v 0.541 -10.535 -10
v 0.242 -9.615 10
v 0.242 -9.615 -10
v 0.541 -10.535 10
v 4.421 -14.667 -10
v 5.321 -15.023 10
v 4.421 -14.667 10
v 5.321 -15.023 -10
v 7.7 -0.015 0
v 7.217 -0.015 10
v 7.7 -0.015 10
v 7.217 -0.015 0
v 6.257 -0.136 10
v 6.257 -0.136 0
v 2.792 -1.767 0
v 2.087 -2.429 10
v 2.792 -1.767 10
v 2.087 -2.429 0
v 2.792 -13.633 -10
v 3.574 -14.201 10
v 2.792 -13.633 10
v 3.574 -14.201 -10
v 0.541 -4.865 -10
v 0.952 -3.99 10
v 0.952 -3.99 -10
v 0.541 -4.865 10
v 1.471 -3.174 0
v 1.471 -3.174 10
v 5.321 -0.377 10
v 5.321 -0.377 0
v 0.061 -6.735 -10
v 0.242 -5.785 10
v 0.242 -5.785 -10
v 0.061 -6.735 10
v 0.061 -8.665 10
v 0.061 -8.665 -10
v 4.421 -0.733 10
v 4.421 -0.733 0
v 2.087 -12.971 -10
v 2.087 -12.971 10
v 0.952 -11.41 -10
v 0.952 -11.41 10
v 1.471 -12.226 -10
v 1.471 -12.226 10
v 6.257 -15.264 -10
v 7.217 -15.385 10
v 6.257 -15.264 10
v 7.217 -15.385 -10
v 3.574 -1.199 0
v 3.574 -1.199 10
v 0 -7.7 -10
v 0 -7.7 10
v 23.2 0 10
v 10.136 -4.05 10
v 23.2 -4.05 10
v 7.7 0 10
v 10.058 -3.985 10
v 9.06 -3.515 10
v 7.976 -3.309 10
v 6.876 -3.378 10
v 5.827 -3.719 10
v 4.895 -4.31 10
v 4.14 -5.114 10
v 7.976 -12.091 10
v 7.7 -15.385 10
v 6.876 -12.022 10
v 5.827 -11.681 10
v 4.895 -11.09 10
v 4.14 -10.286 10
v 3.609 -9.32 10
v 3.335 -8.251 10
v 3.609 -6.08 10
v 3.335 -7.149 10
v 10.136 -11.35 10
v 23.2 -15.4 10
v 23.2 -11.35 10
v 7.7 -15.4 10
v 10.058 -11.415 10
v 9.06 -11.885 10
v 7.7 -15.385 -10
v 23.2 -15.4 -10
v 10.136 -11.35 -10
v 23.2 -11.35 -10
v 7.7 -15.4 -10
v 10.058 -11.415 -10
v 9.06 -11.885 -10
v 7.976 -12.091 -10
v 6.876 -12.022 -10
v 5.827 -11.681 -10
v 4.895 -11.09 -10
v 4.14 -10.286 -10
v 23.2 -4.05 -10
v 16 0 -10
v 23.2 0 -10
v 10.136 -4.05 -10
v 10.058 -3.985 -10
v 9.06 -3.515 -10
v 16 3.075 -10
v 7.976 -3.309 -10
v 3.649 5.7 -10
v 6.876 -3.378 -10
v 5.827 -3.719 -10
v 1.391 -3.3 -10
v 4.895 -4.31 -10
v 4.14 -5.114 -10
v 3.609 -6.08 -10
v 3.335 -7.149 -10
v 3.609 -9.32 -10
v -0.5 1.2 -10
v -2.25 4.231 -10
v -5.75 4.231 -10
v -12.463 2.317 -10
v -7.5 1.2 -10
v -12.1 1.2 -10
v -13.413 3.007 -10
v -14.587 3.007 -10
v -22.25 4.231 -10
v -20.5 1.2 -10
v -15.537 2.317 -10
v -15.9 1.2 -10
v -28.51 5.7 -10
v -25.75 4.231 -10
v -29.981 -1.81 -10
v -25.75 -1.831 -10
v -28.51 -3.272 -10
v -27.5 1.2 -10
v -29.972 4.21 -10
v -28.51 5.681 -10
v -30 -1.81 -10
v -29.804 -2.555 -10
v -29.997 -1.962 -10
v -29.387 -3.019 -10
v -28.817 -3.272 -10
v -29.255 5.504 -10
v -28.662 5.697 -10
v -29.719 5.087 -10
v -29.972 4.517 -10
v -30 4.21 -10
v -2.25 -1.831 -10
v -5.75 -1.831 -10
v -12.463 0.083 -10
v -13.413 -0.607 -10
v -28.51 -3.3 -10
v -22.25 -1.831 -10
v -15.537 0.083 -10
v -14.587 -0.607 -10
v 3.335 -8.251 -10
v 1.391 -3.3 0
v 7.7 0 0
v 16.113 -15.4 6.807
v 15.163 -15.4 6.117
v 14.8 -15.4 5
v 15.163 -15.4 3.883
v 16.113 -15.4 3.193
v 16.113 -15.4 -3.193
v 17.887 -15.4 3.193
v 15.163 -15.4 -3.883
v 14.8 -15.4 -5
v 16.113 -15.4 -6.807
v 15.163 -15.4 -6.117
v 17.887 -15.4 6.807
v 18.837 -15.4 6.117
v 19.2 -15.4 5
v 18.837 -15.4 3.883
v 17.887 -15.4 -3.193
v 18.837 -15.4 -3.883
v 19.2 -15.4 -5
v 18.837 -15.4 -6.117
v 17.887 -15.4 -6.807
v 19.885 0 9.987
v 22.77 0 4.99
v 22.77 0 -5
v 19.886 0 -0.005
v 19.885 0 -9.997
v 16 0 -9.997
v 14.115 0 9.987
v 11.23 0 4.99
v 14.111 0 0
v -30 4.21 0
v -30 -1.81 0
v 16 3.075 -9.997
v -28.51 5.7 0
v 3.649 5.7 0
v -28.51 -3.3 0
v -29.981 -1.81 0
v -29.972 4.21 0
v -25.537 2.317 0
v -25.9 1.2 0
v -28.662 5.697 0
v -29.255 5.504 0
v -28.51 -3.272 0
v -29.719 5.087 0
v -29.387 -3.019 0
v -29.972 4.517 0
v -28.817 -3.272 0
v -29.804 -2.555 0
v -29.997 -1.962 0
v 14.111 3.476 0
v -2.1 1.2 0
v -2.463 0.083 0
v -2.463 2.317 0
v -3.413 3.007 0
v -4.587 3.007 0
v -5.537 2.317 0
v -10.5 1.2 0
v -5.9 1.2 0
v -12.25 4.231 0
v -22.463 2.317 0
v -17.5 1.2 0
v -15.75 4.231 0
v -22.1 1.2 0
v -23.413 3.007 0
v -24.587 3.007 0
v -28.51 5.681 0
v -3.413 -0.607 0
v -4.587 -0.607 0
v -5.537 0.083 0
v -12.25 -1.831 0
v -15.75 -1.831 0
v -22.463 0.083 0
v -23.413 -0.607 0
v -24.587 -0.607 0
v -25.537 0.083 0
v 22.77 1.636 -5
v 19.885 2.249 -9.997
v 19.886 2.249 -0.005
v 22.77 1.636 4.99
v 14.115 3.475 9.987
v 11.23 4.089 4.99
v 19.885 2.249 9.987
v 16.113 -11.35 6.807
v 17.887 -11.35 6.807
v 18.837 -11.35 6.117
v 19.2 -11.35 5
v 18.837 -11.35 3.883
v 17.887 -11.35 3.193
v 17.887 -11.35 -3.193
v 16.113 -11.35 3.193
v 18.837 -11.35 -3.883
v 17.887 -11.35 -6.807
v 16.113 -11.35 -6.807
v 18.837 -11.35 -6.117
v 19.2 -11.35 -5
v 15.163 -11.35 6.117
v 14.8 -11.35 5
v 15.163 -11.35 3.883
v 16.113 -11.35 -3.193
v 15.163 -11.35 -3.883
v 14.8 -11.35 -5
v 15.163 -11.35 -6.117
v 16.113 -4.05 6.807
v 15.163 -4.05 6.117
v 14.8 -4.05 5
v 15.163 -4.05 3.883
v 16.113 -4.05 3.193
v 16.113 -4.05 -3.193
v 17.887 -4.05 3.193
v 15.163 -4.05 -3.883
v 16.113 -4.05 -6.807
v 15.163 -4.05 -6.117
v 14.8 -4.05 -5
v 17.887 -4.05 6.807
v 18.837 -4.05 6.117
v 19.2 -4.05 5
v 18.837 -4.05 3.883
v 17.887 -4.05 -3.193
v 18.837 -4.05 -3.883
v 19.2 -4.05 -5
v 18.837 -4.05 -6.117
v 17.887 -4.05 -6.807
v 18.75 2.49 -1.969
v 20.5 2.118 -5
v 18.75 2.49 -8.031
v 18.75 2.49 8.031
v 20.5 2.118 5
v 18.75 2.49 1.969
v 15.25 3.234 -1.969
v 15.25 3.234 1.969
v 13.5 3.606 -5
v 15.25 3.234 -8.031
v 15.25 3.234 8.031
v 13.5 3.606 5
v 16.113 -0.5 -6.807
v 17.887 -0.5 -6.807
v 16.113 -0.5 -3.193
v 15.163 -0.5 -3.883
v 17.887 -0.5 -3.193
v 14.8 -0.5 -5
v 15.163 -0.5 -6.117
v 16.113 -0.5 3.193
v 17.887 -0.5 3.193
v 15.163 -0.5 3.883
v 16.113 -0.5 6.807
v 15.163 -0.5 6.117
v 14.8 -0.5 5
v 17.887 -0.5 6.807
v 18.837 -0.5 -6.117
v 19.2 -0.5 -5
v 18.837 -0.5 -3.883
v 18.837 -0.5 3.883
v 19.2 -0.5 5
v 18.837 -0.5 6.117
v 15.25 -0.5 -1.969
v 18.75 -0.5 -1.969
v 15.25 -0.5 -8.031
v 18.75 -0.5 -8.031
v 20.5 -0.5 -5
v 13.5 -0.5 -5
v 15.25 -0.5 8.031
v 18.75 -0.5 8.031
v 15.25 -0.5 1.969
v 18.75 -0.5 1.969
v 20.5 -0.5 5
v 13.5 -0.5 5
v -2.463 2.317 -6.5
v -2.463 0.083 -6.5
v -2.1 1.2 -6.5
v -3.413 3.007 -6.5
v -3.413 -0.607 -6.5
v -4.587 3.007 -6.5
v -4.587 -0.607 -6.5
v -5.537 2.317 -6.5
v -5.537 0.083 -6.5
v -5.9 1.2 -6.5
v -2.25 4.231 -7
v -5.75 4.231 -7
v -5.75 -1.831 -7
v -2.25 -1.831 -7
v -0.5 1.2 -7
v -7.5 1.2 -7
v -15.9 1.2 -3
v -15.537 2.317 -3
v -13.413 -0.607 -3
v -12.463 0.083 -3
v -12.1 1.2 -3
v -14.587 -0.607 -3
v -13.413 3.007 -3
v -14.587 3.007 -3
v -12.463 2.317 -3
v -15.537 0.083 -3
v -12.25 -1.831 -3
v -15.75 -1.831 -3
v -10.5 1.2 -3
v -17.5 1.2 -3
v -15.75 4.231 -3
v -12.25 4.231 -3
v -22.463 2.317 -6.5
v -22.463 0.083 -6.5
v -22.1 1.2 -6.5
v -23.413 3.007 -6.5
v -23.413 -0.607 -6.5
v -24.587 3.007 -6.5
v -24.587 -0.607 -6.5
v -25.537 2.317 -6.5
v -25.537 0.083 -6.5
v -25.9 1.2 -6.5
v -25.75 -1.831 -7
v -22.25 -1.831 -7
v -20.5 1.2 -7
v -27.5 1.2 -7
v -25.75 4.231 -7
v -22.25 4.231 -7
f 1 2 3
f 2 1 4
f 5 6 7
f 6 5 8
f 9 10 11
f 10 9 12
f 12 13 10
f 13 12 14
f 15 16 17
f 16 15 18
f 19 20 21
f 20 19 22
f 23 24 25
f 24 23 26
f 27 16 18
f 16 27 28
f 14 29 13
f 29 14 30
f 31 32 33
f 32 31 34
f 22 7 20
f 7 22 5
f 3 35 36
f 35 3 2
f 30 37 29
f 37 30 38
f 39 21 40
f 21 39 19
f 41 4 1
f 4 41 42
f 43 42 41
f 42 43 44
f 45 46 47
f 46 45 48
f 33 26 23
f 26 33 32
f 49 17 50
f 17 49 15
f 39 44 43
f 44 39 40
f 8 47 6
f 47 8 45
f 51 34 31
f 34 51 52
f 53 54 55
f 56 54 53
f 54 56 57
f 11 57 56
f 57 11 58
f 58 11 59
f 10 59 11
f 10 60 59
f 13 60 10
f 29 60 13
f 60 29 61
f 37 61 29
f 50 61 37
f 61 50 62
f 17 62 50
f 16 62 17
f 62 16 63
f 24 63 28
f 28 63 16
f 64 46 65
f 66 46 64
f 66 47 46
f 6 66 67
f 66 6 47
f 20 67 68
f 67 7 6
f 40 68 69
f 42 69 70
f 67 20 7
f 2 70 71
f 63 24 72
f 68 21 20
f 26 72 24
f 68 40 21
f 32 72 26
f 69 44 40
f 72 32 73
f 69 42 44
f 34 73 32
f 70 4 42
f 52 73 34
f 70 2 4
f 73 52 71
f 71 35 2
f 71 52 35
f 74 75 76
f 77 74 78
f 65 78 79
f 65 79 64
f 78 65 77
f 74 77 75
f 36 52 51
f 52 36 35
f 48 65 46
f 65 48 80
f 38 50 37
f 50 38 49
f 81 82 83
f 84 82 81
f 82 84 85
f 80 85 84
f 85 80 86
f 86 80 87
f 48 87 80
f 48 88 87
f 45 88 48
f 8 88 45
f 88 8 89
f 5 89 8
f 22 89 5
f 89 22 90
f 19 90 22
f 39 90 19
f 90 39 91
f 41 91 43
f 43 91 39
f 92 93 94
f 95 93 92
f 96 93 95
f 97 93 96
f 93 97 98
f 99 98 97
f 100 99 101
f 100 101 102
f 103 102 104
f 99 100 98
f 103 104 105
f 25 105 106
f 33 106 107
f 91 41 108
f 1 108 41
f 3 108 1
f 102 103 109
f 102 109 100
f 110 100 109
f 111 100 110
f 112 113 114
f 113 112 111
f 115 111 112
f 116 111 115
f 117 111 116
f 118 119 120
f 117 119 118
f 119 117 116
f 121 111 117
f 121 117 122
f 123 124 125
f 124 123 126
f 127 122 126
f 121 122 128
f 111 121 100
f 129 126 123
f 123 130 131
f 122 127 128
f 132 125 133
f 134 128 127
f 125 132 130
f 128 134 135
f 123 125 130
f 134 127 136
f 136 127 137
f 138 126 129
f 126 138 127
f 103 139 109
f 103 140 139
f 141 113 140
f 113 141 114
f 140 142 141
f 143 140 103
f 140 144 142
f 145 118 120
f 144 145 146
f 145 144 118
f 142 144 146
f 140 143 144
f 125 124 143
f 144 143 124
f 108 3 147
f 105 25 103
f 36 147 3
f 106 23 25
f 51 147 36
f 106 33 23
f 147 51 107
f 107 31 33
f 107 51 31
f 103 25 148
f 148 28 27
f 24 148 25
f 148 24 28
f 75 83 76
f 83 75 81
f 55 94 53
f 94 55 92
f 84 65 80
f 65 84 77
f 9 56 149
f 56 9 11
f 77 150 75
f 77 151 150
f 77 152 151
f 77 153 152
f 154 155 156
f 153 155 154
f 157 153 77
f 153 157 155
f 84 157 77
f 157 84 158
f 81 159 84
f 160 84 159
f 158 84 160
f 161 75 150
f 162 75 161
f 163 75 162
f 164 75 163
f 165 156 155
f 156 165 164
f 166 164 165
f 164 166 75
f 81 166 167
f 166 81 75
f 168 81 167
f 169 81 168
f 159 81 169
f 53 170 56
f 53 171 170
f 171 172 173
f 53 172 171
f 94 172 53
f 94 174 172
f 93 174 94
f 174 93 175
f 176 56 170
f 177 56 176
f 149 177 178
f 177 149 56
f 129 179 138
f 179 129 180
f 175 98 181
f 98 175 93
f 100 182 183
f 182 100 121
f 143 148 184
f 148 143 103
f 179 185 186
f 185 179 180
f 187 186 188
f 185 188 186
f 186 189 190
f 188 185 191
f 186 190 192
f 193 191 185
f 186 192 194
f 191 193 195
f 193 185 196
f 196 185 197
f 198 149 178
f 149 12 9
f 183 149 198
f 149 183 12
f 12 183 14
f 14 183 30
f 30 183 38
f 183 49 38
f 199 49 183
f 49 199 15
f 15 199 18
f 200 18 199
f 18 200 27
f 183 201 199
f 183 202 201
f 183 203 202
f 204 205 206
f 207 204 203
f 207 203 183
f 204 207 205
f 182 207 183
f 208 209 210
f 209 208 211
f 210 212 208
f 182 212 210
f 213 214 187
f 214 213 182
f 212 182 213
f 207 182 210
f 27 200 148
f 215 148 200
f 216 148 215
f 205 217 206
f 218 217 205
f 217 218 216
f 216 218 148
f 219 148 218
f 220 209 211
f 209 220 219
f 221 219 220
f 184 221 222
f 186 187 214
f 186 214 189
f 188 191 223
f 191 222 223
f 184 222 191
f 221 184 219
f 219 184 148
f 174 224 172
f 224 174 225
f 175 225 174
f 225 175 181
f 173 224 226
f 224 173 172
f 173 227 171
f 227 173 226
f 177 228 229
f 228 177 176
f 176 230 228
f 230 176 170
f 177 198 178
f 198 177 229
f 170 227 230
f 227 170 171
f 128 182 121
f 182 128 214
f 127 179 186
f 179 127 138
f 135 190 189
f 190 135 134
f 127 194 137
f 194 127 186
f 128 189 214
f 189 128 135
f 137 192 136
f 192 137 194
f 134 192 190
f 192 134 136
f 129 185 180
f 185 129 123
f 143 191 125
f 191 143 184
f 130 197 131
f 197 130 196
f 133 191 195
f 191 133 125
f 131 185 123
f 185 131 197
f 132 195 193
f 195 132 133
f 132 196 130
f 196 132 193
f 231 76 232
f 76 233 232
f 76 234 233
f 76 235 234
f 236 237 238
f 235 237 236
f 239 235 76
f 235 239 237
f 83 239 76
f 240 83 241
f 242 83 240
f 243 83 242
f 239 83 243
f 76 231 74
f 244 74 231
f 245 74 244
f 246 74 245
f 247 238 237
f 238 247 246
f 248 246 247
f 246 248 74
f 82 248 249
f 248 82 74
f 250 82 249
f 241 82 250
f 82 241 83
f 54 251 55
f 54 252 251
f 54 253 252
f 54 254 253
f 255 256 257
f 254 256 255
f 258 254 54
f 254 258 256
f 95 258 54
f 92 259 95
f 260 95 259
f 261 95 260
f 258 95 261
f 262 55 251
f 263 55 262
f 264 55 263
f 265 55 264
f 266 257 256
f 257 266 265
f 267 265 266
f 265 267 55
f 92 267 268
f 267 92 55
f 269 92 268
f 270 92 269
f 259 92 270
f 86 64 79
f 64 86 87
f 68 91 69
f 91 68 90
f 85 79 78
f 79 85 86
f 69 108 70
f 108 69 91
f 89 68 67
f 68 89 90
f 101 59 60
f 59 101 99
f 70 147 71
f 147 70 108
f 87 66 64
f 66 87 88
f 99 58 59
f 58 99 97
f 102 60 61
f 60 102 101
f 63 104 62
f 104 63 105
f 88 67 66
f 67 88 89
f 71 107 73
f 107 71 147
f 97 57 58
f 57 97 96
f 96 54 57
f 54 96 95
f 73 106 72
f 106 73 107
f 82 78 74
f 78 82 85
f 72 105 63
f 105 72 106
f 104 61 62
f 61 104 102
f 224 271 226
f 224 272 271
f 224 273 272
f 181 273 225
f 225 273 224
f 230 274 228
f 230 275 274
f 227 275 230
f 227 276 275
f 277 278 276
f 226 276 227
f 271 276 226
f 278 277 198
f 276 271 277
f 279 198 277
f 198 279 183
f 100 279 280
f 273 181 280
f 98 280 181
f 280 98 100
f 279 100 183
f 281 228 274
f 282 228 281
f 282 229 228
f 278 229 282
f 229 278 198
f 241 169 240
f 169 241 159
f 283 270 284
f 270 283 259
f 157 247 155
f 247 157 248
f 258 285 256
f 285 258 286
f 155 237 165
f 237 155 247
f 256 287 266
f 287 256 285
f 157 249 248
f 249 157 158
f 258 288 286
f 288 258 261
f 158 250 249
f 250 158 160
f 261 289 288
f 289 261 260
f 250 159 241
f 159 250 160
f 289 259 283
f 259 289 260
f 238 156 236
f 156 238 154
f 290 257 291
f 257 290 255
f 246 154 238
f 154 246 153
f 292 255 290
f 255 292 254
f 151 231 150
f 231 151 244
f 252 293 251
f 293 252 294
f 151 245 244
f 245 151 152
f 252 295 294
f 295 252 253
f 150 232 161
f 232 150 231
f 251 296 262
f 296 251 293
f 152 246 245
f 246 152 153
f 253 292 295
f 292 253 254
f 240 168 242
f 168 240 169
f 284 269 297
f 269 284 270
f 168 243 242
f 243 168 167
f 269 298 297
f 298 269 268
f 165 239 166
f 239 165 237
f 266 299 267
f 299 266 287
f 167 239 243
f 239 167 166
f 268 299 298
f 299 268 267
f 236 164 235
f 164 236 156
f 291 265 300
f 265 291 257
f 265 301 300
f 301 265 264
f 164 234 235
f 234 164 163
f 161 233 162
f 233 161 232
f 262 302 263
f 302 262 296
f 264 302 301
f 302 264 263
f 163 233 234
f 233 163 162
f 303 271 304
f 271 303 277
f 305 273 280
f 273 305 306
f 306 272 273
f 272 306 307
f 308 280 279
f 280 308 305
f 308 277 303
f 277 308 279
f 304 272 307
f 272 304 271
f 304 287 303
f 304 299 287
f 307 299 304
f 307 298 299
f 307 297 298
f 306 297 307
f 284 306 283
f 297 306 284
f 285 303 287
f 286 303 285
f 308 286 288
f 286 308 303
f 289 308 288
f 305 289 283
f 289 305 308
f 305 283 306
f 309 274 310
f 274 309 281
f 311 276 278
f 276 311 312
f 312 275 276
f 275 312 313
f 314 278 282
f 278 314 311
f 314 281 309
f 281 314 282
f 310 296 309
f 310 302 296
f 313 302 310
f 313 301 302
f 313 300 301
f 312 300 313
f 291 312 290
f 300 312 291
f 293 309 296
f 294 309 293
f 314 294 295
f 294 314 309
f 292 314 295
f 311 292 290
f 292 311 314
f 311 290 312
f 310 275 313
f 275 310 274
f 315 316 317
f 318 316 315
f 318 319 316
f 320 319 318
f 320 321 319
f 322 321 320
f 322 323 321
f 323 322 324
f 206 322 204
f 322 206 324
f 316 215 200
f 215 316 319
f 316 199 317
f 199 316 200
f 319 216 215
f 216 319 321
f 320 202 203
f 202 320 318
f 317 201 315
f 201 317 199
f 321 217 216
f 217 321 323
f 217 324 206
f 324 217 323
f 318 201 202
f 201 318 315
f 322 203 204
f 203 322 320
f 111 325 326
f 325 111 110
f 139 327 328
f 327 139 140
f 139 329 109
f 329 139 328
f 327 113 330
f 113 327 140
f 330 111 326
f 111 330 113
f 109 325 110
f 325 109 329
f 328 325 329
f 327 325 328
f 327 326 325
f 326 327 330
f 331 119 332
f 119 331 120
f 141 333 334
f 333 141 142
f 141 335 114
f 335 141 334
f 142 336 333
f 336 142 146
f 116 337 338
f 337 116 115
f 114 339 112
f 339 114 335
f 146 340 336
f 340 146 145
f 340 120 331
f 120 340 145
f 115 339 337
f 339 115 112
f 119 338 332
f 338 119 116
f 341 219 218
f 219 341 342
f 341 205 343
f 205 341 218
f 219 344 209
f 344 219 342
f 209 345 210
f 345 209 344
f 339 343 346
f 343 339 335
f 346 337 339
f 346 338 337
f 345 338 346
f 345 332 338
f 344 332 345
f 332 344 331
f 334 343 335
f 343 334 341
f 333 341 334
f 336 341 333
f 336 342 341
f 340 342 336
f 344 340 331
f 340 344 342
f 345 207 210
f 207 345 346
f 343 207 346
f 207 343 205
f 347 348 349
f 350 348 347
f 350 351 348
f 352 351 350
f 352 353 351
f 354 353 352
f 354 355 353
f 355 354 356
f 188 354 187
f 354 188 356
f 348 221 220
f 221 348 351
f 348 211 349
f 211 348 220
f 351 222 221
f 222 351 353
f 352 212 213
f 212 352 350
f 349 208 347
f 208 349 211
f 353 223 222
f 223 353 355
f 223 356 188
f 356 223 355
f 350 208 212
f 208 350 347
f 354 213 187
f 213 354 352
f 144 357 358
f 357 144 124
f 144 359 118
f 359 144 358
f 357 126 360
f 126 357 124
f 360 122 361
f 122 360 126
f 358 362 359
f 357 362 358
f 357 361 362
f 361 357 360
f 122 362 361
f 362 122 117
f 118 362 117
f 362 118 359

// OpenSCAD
// PRUSA Mendel
// Vertical Adjustable Opto Z Endstop Holder
// Used to attach endstops to 8mm rods
// GNU GPL v3
// Shannon Little from Geoff Drake from original idea by Josef Průša
// Tags: endstop, opto_endstop, adjustable_endstop, mendel, prusa, mount, openscad, opto, z_axis_endstop, z-axis, axis, part
// Version 1.0

// This is a derivative of http://www.thingiverse.com/thing:15448

/**
 * @id vertical-adjustable-z-endstop-holder
 * @name Vertical Adjustable Z Endstop Holder
 * @category Printed
 * @using 2 m3x25xhex
 * @using 1 m3x35xhex
 * @using 2 m3nut
 * @using 3 m3nylock
 * @using 2 m3washer
 * @using 2 4-40nut
 * @using 2 4-40x5/8
 * @using 1 spring
 */

// % Background Modifier
// # Debug Modifier
// ! Root Modifier
// * Disable Modifier


// The M3 bolt holes should be as close to the actual bolt diameter as possible so the bolts wiggle as little as possible (this is critical to keep the opto from pivoting around the center bolt)
// You may need to drill the hole out just slightly so the bolts barely fit (I used Harbor Freight drill bit #32, which measures 2.91mm or 0.114in)
m3Diameter = 3.8;
m3NutDiameter = 7.0;						// You may need to tweak this for your machine
m8Diameter = 8.8;
outerDiameter = m8Diameter / 2 + 3.3;
openingSize = m8Diameter - 1.5;

optoMountBoltDiameter = 4.35;				// This is a little larger than necessary to allow some wiggle room on installing the opto pcb
optoMountNutDiameter = 7.8; 				// This is sized for a 4-40 nut, use the above m3NutDiameter value for M3 nuts

armLength = 31;
armWidth = 9;
holderHeight = 12;
holderAdditionalWidth = 1;
springDiameter = 5.9;
springHolderDepth = 1;
cornerRound = 3;
boltOffset = 4;
boltSpacing = 10;


// Uncomment these individually to export each part for printing

//thumbscrew();
rotate([180, 0, 0]) endstop();
//holder();

// Comment these out when printing the parts, this view only shows the parts in assembled positions

// endstop();
// translate([1, armWidth - 5, 19]) rotate([0, 0, 180]) holder();
// translate([-boltOffset, -1, -10]) rotate([180, 0, 0]) thumbscrewLowPoly();						// OpenSCAD was choking on the higher poly thumbscrews so these are low poly ones just for previewing, when printing use the normal high poly ones above
// translate([-boltOffset - boltSpacing * 2, -1, -10]) rotate([180, 0, 0]) thumbscrewLowPoly();
// showAssemblyHardware();










module showAssemblyHardware() {
	translate([-boltOffset, -1, -10]) {
		translate([0, 0, -35]) hexBolt(3, 25);
		translate([0, 0, 4]) hexNut(3, 25);
		translate([0, 0, 23]) hexNylock(3, 25);
	}

	translate([-boltOffset - boltSpacing, -1, -10]) {
		translate([0, 0, 80]) rotate([180, 0, 0]) hexBolt(3, 25);
		translate([0, 0, 6]) rotate([180, 0, 0]) hexNylock(3, 25);
		translate([0, 0, 43]) color("silver") linear_extrude(height = 10, center = false, convexity = 10, twist = 3000, $fn = 15) translate([2.3, 0, 0]) circle(r = 0.2);
	}

	translate([-boltOffset - boltSpacing * 2, -1, -10]) {
		translate([0, 0, -35]) hexBolt(3, 25);
		translate([0, 0, 4]) hexNut(3, 25);
		translate([0, 0, 23]) hexNylock(3, 25);
	}
}


// These are not really accurate, they are just for showing how to assemble the endstop
module hexBolt(diameter = 3, height = 30) {
	color("silver")
	union() {
		cylinder(h = 1.5, r = 1.5 + diameter / 2, $fn = 6);
		cylinder(h = height, r = diameter / 2, $fn = 20);
	}
}


module hexNut(diameter = 3) {
	color("silver")
	difference() {
		cylinder(h = 1.5, r = 1.5 + diameter / 2, $fn = 6);
		translate([0, 0, -0.5]) cylinder(h = 3, r = diameter / 2, $fn = 20);
	}
}


module hexNylock(diameter = 3) {
	color("silver")
	difference() {
		union() {
			cylinder(h = 1.5, r = 1.5 + diameter / 2, $fn = 6);
			translate([0, 0, 1.5]) sphere(r = diameter / 2 + 0.6, $fn = 20);
		}

		translate([0, 0, -0.5]) cylinder(h = diameter * 2, r = diameter / 2, $fn = 20);
		translate([0, 0, -diameter]) cube(size = diameter * 2, center = true);
	}
}


module endstop() {
	difference() {
		// Outline
		union() {
			translate([outerDiameter, outerDiameter, -10]) cylinder(h = 20, r = outerDiameter, $fn = 50);									// Round clamp
			translate([outerDiameter, 0, -10]) cube([15.5, outerDiameter * 2,20]);														// Cube clamp
			translate([-armLength + 1, outerDiameter - m8Diameter / 2, 0]) rotate([90, 0, 0]) cube([armLength + 15, 10, armWidth]);		// Arm
            translate([17, 3, 5]) rotate([90, 0, 0]) cylinder(h = armWidth - 0.3, r = 5.77, $fn = 6);                                   // Nut trap
            translate([17, 3, -5+.01]) rotate([90, 0, 0]) cylinder(h = armWidth - 0.3, r = 5.77, $fn = 6);                                   // Nut trap
		}

		// Clamp
		translate([9, outerDiameter - openingSize / 2, -10.1]) 	cube([18, openingSize, 22]);								// Endstop opening slot
		translate([outerDiameter, outerDiameter, -10.1]) 		cylinder(h = 25, r = m8Diameter / 2, $fn = 25);				// Endstop rod clamp opening
		translate([outerDiameter - 3, -outerDiameter - armWidth + 1, -11]) rotate([0, 0, 12]) cube([25, 10, 22]);			// Nut trap slant
        translate([17 - 0.3, 17, 5])    rotate([90, 0, 0])      cylinder(h = 20, r = m3Diameter / 2, $fn = 10);             // Clamp bolt opening (2 are here on purpose to make it oval)
        translate([17 - 0.3, 17, -5])    rotate([90, 0, 0])      cylinder(h = 20, r = m3Diameter / 2, $fn = 10);             // Clamp bolt opening (2 are here on purpose to make it oval)
        translate([17 + 0.3, 17, 5])    rotate([90, 0, 0])      cylinder(h = 20, r = m3Diameter / 2, $fn = 10);             // Clamp bolt opening
        translate([17 + 0.3, 17, -5])    rotate([90, 0, 0])      cylinder(h = 20, r = m3Diameter / 2, $fn = 10);             // Clamp bolt opening
        translate([17, 0.5, 5])         rotate([90, 0, 0])      cylinder(h = 15, r = m3NutDiameter / 2, $fn = 6);           // Clamp nut trap opening
        translate([17, 0.5, -5])         rotate([90, 0, 0])      cylinder(h = 15, r = m3NutDiameter / 2, $fn = 6);           // Clamp nut trap opening

		// Arm
		translate([-boltOffset, outerDiameter - m8Diameter / 2 - armWidth / 2, -13.5]) 					cylinder(h = 20, r = m3Diameter / 2, $fn = 10);				// Inner adjustment bolt hole
		translate([-boltOffset, outerDiameter - m8Diameter / 2 - armWidth / 2, 7]) 					cylinder(h = 20, r = m3NutDiameter / 2, $fn = 6);			// Inner adjustment nut trap hole
		translate([-boltOffset - boltSpacing, outerDiameter - m8Diameter / 2 - armWidth / 2, -5]) 		cylinder(h = 20, r = m3Diameter / 2, $fn = 10);				// Center spring bolt hole
		translate([-boltOffset - boltSpacing, outerDiameter - m8Diameter / 2 - armWidth / 2, -1]) 		cylinder(h = 4, r = m3NutDiameter / 2, $fn = 6);			// Center spring bolt nut trap hole
		translate([-boltOffset - boltSpacing * 2, outerDiameter - m8Diameter / 2 - armWidth / 2, -13.5]) 	cylinder(h = 20, r = m3Diameter / 2, $fn = 10);				// Outer adjustment bolt hole
		translate([-boltOffset - boltSpacing * 2, outerDiameter - m8Diameter / 2 - armWidth / 2, 7]) 	cylinder(h = 20, r = m3NutDiameter / 2, $fn = 6);			// Outer adjustment nut trap hole

		// Arm end rounding
		translate([-armLength + 1 + cornerRound / 2 - 0.01, outerDiameter - m8Diameter / 2 - armWidth + cornerRound / 2 - 0.01, holderHeight / 2]) rotate([90, 0, 0]) 	curve(cornerRound, holderHeight + 2);
		translate([-armLength + 1 + cornerRound / 2 - 0.01, outerDiameter - m8Diameter / 2 - cornerRound / 2 + 0.01, holderHeight / 2]) rotate([90, 0, -90]) 			curve(cornerRound, holderHeight + 2);
	}
}


module holder() {
	holderOffsetX = -5;
	optoMountHoleZ = holderHeight - 5;	// holderHeight / 2 use this to place in center

	difference() {
		union() {
			translate([-holderAdditionalWidth, 0, 0])cube([armLength + holderAdditionalWidth, armWidth, holderHeight]);
		}

		translate([1 + boltOffset, armWidth / 2, -1]) 													cylinder(h = 4.2, r = m3Diameter / 2, $fn = 10);									// Inner arm bolt guide
		translate([1 + boltOffset + boltSpacing, armWidth / 2, -1]) 									cylinder(h = 2 + holderHeight, r = m3Diameter / 2, $fn = 10);						// Center arm bolt hole
		translate([1 + boltOffset + boltSpacing, armWidth / 2, holderHeight - springHolderDepth])	 	cylinder(h = springHolderDepth + 2, r = springDiameter / 2, $fn = 14);				// Center spring hole
		translate([1 + boltOffset + boltSpacing * 2, armWidth / 2, -1]) 								cylinder(h = 4.2, r = m3Diameter / 2, $fn = 10);									// Outer arm bolt guide

		translate([1 + boltOffset, armWidth + 2, optoMountHoleZ]) rotate([90, 0 ,0])						cylinder(h = armWidth + 4, r = optoMountBoltDiameter / 2, $fn = 10);			// Inner opto bolt hole
		translate([1 + boltOffset, armWidth + 0.2, optoMountHoleZ]) rotate([90, 90, 0])						cylinder(h = 3.1, r = optoMountNutDiameter / 2, $fn = 6);						// Inner opto nut trap hole
		translate([1 + boltOffset + boltSpacing * 2, armWidth + 2, optoMountHoleZ]) rotate([90, 0 ,0])		cylinder(h = armWidth + 4, r = optoMountBoltDiameter / 2, $fn = 10);			// Outer opto bolt hole
		translate([1 + boltOffset + boltSpacing * 2, armWidth + 0.2, optoMountHoleZ]) rotate([90, 90, 0])	cylinder(h = 3.1, r = optoMountNutDiameter / 2, $fn = 6);						// Outer opto nut trap hole

		// Arm end rounding
		translate([-holderAdditionalWidth + cornerRound / 2 - 0.01, armWidth - cornerRound / 2 + 0.01, holderHeight / 2]) 	rotate([90, 0, -90]) 	curve(cornerRound, holderHeight + 2);
		translate([armLength - cornerRound / 2 + 0.01, armWidth - cornerRound / 2 + 0.01, holderHeight / 2]) 				rotate([90, 0, 180]) 	curve(cornerRound, holderHeight + 2);
	}
}


module curve(rad = 6, height = 3) {
	difference() {
		translate([-rad / 4, 0,  rad / 4]) cube([rad / 2, height, rad / 2], center = true);
		rotate([90, 0, 0]) translate([0.005, -0.005 , 0]) cylinder(r = rad / 2, h = height + 1, center = true, $fn = 15);
	}
}


module thumbscrew() {
	difference() {
		knurled_cyl(4, 15, 2, 2, 1, 2, 0);
		cylinder(r = m3Diameter / 2, h = 4, $fn = 10);
		translate([0, 0, 2]) cylinder(h = 3, r = m3NutDiameter / 2, $fn = 6);
	}
}


module thumbscrewLowPoly() {
	difference() {
		knurled_cyl(4, 15, 6, 6, 1, 2, 0);
		cylinder(r = m3Diameter / 2, h = 4, $fn = 10);
		translate([0, 0, 2]) cylinder(h = 3, r = m3NutDiameter / 2, $fn = 6);
	}
}




// ****************************** All the needed libraries are included below ******************************







/*
 * knurledFinishLib.scad
 *
 * Written by aubenc @ Thingiverse
 *
 * This script is licensed under the Public Domain license.
 *
 * http://www.thingiverse.com/thing:9095
 *
 * Usage:
 *
 *    knurled_cyl( Knurled cylinder height,
 *                 Knurled cylinder outer diameter,
 *                 Knurl polyhedron width,
 *                 Knurl polyhedron height,
 *                 Knurl polyhedron depth,
 *                 Cylinder ends smoothed height,
 *                 Knurled surface smoothing amount );
 */
module knurled_cyl(chg, cod, cwd, csh, cdp, fsh, smt)
{
    cord=(cod+cdp+cdp*smt/100)/2;
    cird=cord-cdp;
    cfn=round(2*cird*PI/cwd);
    clf=360/cfn;
    crn=ceil(chg/csh);

    intersection()
    {
        shape(fsh, cird, cord-cdp*smt/100, cfn*4, chg);

        translate([0,0,-(crn*csh-chg)/2])
          knurled_finish(cord, cird, clf, csh, cfn, crn);
    }
}

module shape(hsh, ird, ord, fn4, hg)
{
        union()
        {
            cylinder(h=hsh, r1=ird, r2=ord, $fn=fn4, center=false);

            translate([0,0,hsh-0.002])
              cylinder(h=hg-2*hsh+0.004, r=ord, $fn=fn4, center=false);

            translate([0,0,hg-hsh])
              cylinder(h=hsh, r1=ord, r2=ird, $fn=fn4, center=false);
        }

}

module knurled_finish(ord, ird, lf, sh, fn, rn)
{
    for(j=[0:rn-1])
    assign(h0=sh*j, h1=sh*(j+1/2), h2=sh*(j+1))
    {
        for(i=[0:fn-1])
        assign(lf0=lf*i, lf1=lf*(i+1/2), lf2=lf*(i+1))
        {
            polyhedron(
                points=[
                     [ 0,0,h0],
                     [ ord*cos(lf0), ord*sin(lf0), h0],
                     [ ird*cos(lf1), ird*sin(lf1), h0],
                     [ ord*cos(lf2), ord*sin(lf2), h0],

                     [ ird*cos(lf0), ird*sin(lf0), h1],
                     [ ord*cos(lf1), ord*sin(lf1), h1],
                     [ ird*cos(lf2), ird*sin(lf2), h1],

                     [ 0,0,h2],
                     [ ord*cos(lf0), ord*sin(lf0), h2],
                     [ ird*cos(lf1), ird*sin(lf1), h2],
                     [ ord*cos(lf2), ord*sin(lf2), h2]
                    ],
                triangles=[
                     [0,1,2],[2,3,0],
                     [1,0,4],[4,0,7],[7,8,4],
                     [8,7,9],[10,9,7],
                     [10,7,6],[6,7,0],[3,6,0],
                     [2,1,4],[3,2,6],[10,6,9],[8,9,4],
                     [4,5,2],[2,5,6],[6,5,9],[9,5,4]
                    ],
                convexity=5);
         }
    }
}
